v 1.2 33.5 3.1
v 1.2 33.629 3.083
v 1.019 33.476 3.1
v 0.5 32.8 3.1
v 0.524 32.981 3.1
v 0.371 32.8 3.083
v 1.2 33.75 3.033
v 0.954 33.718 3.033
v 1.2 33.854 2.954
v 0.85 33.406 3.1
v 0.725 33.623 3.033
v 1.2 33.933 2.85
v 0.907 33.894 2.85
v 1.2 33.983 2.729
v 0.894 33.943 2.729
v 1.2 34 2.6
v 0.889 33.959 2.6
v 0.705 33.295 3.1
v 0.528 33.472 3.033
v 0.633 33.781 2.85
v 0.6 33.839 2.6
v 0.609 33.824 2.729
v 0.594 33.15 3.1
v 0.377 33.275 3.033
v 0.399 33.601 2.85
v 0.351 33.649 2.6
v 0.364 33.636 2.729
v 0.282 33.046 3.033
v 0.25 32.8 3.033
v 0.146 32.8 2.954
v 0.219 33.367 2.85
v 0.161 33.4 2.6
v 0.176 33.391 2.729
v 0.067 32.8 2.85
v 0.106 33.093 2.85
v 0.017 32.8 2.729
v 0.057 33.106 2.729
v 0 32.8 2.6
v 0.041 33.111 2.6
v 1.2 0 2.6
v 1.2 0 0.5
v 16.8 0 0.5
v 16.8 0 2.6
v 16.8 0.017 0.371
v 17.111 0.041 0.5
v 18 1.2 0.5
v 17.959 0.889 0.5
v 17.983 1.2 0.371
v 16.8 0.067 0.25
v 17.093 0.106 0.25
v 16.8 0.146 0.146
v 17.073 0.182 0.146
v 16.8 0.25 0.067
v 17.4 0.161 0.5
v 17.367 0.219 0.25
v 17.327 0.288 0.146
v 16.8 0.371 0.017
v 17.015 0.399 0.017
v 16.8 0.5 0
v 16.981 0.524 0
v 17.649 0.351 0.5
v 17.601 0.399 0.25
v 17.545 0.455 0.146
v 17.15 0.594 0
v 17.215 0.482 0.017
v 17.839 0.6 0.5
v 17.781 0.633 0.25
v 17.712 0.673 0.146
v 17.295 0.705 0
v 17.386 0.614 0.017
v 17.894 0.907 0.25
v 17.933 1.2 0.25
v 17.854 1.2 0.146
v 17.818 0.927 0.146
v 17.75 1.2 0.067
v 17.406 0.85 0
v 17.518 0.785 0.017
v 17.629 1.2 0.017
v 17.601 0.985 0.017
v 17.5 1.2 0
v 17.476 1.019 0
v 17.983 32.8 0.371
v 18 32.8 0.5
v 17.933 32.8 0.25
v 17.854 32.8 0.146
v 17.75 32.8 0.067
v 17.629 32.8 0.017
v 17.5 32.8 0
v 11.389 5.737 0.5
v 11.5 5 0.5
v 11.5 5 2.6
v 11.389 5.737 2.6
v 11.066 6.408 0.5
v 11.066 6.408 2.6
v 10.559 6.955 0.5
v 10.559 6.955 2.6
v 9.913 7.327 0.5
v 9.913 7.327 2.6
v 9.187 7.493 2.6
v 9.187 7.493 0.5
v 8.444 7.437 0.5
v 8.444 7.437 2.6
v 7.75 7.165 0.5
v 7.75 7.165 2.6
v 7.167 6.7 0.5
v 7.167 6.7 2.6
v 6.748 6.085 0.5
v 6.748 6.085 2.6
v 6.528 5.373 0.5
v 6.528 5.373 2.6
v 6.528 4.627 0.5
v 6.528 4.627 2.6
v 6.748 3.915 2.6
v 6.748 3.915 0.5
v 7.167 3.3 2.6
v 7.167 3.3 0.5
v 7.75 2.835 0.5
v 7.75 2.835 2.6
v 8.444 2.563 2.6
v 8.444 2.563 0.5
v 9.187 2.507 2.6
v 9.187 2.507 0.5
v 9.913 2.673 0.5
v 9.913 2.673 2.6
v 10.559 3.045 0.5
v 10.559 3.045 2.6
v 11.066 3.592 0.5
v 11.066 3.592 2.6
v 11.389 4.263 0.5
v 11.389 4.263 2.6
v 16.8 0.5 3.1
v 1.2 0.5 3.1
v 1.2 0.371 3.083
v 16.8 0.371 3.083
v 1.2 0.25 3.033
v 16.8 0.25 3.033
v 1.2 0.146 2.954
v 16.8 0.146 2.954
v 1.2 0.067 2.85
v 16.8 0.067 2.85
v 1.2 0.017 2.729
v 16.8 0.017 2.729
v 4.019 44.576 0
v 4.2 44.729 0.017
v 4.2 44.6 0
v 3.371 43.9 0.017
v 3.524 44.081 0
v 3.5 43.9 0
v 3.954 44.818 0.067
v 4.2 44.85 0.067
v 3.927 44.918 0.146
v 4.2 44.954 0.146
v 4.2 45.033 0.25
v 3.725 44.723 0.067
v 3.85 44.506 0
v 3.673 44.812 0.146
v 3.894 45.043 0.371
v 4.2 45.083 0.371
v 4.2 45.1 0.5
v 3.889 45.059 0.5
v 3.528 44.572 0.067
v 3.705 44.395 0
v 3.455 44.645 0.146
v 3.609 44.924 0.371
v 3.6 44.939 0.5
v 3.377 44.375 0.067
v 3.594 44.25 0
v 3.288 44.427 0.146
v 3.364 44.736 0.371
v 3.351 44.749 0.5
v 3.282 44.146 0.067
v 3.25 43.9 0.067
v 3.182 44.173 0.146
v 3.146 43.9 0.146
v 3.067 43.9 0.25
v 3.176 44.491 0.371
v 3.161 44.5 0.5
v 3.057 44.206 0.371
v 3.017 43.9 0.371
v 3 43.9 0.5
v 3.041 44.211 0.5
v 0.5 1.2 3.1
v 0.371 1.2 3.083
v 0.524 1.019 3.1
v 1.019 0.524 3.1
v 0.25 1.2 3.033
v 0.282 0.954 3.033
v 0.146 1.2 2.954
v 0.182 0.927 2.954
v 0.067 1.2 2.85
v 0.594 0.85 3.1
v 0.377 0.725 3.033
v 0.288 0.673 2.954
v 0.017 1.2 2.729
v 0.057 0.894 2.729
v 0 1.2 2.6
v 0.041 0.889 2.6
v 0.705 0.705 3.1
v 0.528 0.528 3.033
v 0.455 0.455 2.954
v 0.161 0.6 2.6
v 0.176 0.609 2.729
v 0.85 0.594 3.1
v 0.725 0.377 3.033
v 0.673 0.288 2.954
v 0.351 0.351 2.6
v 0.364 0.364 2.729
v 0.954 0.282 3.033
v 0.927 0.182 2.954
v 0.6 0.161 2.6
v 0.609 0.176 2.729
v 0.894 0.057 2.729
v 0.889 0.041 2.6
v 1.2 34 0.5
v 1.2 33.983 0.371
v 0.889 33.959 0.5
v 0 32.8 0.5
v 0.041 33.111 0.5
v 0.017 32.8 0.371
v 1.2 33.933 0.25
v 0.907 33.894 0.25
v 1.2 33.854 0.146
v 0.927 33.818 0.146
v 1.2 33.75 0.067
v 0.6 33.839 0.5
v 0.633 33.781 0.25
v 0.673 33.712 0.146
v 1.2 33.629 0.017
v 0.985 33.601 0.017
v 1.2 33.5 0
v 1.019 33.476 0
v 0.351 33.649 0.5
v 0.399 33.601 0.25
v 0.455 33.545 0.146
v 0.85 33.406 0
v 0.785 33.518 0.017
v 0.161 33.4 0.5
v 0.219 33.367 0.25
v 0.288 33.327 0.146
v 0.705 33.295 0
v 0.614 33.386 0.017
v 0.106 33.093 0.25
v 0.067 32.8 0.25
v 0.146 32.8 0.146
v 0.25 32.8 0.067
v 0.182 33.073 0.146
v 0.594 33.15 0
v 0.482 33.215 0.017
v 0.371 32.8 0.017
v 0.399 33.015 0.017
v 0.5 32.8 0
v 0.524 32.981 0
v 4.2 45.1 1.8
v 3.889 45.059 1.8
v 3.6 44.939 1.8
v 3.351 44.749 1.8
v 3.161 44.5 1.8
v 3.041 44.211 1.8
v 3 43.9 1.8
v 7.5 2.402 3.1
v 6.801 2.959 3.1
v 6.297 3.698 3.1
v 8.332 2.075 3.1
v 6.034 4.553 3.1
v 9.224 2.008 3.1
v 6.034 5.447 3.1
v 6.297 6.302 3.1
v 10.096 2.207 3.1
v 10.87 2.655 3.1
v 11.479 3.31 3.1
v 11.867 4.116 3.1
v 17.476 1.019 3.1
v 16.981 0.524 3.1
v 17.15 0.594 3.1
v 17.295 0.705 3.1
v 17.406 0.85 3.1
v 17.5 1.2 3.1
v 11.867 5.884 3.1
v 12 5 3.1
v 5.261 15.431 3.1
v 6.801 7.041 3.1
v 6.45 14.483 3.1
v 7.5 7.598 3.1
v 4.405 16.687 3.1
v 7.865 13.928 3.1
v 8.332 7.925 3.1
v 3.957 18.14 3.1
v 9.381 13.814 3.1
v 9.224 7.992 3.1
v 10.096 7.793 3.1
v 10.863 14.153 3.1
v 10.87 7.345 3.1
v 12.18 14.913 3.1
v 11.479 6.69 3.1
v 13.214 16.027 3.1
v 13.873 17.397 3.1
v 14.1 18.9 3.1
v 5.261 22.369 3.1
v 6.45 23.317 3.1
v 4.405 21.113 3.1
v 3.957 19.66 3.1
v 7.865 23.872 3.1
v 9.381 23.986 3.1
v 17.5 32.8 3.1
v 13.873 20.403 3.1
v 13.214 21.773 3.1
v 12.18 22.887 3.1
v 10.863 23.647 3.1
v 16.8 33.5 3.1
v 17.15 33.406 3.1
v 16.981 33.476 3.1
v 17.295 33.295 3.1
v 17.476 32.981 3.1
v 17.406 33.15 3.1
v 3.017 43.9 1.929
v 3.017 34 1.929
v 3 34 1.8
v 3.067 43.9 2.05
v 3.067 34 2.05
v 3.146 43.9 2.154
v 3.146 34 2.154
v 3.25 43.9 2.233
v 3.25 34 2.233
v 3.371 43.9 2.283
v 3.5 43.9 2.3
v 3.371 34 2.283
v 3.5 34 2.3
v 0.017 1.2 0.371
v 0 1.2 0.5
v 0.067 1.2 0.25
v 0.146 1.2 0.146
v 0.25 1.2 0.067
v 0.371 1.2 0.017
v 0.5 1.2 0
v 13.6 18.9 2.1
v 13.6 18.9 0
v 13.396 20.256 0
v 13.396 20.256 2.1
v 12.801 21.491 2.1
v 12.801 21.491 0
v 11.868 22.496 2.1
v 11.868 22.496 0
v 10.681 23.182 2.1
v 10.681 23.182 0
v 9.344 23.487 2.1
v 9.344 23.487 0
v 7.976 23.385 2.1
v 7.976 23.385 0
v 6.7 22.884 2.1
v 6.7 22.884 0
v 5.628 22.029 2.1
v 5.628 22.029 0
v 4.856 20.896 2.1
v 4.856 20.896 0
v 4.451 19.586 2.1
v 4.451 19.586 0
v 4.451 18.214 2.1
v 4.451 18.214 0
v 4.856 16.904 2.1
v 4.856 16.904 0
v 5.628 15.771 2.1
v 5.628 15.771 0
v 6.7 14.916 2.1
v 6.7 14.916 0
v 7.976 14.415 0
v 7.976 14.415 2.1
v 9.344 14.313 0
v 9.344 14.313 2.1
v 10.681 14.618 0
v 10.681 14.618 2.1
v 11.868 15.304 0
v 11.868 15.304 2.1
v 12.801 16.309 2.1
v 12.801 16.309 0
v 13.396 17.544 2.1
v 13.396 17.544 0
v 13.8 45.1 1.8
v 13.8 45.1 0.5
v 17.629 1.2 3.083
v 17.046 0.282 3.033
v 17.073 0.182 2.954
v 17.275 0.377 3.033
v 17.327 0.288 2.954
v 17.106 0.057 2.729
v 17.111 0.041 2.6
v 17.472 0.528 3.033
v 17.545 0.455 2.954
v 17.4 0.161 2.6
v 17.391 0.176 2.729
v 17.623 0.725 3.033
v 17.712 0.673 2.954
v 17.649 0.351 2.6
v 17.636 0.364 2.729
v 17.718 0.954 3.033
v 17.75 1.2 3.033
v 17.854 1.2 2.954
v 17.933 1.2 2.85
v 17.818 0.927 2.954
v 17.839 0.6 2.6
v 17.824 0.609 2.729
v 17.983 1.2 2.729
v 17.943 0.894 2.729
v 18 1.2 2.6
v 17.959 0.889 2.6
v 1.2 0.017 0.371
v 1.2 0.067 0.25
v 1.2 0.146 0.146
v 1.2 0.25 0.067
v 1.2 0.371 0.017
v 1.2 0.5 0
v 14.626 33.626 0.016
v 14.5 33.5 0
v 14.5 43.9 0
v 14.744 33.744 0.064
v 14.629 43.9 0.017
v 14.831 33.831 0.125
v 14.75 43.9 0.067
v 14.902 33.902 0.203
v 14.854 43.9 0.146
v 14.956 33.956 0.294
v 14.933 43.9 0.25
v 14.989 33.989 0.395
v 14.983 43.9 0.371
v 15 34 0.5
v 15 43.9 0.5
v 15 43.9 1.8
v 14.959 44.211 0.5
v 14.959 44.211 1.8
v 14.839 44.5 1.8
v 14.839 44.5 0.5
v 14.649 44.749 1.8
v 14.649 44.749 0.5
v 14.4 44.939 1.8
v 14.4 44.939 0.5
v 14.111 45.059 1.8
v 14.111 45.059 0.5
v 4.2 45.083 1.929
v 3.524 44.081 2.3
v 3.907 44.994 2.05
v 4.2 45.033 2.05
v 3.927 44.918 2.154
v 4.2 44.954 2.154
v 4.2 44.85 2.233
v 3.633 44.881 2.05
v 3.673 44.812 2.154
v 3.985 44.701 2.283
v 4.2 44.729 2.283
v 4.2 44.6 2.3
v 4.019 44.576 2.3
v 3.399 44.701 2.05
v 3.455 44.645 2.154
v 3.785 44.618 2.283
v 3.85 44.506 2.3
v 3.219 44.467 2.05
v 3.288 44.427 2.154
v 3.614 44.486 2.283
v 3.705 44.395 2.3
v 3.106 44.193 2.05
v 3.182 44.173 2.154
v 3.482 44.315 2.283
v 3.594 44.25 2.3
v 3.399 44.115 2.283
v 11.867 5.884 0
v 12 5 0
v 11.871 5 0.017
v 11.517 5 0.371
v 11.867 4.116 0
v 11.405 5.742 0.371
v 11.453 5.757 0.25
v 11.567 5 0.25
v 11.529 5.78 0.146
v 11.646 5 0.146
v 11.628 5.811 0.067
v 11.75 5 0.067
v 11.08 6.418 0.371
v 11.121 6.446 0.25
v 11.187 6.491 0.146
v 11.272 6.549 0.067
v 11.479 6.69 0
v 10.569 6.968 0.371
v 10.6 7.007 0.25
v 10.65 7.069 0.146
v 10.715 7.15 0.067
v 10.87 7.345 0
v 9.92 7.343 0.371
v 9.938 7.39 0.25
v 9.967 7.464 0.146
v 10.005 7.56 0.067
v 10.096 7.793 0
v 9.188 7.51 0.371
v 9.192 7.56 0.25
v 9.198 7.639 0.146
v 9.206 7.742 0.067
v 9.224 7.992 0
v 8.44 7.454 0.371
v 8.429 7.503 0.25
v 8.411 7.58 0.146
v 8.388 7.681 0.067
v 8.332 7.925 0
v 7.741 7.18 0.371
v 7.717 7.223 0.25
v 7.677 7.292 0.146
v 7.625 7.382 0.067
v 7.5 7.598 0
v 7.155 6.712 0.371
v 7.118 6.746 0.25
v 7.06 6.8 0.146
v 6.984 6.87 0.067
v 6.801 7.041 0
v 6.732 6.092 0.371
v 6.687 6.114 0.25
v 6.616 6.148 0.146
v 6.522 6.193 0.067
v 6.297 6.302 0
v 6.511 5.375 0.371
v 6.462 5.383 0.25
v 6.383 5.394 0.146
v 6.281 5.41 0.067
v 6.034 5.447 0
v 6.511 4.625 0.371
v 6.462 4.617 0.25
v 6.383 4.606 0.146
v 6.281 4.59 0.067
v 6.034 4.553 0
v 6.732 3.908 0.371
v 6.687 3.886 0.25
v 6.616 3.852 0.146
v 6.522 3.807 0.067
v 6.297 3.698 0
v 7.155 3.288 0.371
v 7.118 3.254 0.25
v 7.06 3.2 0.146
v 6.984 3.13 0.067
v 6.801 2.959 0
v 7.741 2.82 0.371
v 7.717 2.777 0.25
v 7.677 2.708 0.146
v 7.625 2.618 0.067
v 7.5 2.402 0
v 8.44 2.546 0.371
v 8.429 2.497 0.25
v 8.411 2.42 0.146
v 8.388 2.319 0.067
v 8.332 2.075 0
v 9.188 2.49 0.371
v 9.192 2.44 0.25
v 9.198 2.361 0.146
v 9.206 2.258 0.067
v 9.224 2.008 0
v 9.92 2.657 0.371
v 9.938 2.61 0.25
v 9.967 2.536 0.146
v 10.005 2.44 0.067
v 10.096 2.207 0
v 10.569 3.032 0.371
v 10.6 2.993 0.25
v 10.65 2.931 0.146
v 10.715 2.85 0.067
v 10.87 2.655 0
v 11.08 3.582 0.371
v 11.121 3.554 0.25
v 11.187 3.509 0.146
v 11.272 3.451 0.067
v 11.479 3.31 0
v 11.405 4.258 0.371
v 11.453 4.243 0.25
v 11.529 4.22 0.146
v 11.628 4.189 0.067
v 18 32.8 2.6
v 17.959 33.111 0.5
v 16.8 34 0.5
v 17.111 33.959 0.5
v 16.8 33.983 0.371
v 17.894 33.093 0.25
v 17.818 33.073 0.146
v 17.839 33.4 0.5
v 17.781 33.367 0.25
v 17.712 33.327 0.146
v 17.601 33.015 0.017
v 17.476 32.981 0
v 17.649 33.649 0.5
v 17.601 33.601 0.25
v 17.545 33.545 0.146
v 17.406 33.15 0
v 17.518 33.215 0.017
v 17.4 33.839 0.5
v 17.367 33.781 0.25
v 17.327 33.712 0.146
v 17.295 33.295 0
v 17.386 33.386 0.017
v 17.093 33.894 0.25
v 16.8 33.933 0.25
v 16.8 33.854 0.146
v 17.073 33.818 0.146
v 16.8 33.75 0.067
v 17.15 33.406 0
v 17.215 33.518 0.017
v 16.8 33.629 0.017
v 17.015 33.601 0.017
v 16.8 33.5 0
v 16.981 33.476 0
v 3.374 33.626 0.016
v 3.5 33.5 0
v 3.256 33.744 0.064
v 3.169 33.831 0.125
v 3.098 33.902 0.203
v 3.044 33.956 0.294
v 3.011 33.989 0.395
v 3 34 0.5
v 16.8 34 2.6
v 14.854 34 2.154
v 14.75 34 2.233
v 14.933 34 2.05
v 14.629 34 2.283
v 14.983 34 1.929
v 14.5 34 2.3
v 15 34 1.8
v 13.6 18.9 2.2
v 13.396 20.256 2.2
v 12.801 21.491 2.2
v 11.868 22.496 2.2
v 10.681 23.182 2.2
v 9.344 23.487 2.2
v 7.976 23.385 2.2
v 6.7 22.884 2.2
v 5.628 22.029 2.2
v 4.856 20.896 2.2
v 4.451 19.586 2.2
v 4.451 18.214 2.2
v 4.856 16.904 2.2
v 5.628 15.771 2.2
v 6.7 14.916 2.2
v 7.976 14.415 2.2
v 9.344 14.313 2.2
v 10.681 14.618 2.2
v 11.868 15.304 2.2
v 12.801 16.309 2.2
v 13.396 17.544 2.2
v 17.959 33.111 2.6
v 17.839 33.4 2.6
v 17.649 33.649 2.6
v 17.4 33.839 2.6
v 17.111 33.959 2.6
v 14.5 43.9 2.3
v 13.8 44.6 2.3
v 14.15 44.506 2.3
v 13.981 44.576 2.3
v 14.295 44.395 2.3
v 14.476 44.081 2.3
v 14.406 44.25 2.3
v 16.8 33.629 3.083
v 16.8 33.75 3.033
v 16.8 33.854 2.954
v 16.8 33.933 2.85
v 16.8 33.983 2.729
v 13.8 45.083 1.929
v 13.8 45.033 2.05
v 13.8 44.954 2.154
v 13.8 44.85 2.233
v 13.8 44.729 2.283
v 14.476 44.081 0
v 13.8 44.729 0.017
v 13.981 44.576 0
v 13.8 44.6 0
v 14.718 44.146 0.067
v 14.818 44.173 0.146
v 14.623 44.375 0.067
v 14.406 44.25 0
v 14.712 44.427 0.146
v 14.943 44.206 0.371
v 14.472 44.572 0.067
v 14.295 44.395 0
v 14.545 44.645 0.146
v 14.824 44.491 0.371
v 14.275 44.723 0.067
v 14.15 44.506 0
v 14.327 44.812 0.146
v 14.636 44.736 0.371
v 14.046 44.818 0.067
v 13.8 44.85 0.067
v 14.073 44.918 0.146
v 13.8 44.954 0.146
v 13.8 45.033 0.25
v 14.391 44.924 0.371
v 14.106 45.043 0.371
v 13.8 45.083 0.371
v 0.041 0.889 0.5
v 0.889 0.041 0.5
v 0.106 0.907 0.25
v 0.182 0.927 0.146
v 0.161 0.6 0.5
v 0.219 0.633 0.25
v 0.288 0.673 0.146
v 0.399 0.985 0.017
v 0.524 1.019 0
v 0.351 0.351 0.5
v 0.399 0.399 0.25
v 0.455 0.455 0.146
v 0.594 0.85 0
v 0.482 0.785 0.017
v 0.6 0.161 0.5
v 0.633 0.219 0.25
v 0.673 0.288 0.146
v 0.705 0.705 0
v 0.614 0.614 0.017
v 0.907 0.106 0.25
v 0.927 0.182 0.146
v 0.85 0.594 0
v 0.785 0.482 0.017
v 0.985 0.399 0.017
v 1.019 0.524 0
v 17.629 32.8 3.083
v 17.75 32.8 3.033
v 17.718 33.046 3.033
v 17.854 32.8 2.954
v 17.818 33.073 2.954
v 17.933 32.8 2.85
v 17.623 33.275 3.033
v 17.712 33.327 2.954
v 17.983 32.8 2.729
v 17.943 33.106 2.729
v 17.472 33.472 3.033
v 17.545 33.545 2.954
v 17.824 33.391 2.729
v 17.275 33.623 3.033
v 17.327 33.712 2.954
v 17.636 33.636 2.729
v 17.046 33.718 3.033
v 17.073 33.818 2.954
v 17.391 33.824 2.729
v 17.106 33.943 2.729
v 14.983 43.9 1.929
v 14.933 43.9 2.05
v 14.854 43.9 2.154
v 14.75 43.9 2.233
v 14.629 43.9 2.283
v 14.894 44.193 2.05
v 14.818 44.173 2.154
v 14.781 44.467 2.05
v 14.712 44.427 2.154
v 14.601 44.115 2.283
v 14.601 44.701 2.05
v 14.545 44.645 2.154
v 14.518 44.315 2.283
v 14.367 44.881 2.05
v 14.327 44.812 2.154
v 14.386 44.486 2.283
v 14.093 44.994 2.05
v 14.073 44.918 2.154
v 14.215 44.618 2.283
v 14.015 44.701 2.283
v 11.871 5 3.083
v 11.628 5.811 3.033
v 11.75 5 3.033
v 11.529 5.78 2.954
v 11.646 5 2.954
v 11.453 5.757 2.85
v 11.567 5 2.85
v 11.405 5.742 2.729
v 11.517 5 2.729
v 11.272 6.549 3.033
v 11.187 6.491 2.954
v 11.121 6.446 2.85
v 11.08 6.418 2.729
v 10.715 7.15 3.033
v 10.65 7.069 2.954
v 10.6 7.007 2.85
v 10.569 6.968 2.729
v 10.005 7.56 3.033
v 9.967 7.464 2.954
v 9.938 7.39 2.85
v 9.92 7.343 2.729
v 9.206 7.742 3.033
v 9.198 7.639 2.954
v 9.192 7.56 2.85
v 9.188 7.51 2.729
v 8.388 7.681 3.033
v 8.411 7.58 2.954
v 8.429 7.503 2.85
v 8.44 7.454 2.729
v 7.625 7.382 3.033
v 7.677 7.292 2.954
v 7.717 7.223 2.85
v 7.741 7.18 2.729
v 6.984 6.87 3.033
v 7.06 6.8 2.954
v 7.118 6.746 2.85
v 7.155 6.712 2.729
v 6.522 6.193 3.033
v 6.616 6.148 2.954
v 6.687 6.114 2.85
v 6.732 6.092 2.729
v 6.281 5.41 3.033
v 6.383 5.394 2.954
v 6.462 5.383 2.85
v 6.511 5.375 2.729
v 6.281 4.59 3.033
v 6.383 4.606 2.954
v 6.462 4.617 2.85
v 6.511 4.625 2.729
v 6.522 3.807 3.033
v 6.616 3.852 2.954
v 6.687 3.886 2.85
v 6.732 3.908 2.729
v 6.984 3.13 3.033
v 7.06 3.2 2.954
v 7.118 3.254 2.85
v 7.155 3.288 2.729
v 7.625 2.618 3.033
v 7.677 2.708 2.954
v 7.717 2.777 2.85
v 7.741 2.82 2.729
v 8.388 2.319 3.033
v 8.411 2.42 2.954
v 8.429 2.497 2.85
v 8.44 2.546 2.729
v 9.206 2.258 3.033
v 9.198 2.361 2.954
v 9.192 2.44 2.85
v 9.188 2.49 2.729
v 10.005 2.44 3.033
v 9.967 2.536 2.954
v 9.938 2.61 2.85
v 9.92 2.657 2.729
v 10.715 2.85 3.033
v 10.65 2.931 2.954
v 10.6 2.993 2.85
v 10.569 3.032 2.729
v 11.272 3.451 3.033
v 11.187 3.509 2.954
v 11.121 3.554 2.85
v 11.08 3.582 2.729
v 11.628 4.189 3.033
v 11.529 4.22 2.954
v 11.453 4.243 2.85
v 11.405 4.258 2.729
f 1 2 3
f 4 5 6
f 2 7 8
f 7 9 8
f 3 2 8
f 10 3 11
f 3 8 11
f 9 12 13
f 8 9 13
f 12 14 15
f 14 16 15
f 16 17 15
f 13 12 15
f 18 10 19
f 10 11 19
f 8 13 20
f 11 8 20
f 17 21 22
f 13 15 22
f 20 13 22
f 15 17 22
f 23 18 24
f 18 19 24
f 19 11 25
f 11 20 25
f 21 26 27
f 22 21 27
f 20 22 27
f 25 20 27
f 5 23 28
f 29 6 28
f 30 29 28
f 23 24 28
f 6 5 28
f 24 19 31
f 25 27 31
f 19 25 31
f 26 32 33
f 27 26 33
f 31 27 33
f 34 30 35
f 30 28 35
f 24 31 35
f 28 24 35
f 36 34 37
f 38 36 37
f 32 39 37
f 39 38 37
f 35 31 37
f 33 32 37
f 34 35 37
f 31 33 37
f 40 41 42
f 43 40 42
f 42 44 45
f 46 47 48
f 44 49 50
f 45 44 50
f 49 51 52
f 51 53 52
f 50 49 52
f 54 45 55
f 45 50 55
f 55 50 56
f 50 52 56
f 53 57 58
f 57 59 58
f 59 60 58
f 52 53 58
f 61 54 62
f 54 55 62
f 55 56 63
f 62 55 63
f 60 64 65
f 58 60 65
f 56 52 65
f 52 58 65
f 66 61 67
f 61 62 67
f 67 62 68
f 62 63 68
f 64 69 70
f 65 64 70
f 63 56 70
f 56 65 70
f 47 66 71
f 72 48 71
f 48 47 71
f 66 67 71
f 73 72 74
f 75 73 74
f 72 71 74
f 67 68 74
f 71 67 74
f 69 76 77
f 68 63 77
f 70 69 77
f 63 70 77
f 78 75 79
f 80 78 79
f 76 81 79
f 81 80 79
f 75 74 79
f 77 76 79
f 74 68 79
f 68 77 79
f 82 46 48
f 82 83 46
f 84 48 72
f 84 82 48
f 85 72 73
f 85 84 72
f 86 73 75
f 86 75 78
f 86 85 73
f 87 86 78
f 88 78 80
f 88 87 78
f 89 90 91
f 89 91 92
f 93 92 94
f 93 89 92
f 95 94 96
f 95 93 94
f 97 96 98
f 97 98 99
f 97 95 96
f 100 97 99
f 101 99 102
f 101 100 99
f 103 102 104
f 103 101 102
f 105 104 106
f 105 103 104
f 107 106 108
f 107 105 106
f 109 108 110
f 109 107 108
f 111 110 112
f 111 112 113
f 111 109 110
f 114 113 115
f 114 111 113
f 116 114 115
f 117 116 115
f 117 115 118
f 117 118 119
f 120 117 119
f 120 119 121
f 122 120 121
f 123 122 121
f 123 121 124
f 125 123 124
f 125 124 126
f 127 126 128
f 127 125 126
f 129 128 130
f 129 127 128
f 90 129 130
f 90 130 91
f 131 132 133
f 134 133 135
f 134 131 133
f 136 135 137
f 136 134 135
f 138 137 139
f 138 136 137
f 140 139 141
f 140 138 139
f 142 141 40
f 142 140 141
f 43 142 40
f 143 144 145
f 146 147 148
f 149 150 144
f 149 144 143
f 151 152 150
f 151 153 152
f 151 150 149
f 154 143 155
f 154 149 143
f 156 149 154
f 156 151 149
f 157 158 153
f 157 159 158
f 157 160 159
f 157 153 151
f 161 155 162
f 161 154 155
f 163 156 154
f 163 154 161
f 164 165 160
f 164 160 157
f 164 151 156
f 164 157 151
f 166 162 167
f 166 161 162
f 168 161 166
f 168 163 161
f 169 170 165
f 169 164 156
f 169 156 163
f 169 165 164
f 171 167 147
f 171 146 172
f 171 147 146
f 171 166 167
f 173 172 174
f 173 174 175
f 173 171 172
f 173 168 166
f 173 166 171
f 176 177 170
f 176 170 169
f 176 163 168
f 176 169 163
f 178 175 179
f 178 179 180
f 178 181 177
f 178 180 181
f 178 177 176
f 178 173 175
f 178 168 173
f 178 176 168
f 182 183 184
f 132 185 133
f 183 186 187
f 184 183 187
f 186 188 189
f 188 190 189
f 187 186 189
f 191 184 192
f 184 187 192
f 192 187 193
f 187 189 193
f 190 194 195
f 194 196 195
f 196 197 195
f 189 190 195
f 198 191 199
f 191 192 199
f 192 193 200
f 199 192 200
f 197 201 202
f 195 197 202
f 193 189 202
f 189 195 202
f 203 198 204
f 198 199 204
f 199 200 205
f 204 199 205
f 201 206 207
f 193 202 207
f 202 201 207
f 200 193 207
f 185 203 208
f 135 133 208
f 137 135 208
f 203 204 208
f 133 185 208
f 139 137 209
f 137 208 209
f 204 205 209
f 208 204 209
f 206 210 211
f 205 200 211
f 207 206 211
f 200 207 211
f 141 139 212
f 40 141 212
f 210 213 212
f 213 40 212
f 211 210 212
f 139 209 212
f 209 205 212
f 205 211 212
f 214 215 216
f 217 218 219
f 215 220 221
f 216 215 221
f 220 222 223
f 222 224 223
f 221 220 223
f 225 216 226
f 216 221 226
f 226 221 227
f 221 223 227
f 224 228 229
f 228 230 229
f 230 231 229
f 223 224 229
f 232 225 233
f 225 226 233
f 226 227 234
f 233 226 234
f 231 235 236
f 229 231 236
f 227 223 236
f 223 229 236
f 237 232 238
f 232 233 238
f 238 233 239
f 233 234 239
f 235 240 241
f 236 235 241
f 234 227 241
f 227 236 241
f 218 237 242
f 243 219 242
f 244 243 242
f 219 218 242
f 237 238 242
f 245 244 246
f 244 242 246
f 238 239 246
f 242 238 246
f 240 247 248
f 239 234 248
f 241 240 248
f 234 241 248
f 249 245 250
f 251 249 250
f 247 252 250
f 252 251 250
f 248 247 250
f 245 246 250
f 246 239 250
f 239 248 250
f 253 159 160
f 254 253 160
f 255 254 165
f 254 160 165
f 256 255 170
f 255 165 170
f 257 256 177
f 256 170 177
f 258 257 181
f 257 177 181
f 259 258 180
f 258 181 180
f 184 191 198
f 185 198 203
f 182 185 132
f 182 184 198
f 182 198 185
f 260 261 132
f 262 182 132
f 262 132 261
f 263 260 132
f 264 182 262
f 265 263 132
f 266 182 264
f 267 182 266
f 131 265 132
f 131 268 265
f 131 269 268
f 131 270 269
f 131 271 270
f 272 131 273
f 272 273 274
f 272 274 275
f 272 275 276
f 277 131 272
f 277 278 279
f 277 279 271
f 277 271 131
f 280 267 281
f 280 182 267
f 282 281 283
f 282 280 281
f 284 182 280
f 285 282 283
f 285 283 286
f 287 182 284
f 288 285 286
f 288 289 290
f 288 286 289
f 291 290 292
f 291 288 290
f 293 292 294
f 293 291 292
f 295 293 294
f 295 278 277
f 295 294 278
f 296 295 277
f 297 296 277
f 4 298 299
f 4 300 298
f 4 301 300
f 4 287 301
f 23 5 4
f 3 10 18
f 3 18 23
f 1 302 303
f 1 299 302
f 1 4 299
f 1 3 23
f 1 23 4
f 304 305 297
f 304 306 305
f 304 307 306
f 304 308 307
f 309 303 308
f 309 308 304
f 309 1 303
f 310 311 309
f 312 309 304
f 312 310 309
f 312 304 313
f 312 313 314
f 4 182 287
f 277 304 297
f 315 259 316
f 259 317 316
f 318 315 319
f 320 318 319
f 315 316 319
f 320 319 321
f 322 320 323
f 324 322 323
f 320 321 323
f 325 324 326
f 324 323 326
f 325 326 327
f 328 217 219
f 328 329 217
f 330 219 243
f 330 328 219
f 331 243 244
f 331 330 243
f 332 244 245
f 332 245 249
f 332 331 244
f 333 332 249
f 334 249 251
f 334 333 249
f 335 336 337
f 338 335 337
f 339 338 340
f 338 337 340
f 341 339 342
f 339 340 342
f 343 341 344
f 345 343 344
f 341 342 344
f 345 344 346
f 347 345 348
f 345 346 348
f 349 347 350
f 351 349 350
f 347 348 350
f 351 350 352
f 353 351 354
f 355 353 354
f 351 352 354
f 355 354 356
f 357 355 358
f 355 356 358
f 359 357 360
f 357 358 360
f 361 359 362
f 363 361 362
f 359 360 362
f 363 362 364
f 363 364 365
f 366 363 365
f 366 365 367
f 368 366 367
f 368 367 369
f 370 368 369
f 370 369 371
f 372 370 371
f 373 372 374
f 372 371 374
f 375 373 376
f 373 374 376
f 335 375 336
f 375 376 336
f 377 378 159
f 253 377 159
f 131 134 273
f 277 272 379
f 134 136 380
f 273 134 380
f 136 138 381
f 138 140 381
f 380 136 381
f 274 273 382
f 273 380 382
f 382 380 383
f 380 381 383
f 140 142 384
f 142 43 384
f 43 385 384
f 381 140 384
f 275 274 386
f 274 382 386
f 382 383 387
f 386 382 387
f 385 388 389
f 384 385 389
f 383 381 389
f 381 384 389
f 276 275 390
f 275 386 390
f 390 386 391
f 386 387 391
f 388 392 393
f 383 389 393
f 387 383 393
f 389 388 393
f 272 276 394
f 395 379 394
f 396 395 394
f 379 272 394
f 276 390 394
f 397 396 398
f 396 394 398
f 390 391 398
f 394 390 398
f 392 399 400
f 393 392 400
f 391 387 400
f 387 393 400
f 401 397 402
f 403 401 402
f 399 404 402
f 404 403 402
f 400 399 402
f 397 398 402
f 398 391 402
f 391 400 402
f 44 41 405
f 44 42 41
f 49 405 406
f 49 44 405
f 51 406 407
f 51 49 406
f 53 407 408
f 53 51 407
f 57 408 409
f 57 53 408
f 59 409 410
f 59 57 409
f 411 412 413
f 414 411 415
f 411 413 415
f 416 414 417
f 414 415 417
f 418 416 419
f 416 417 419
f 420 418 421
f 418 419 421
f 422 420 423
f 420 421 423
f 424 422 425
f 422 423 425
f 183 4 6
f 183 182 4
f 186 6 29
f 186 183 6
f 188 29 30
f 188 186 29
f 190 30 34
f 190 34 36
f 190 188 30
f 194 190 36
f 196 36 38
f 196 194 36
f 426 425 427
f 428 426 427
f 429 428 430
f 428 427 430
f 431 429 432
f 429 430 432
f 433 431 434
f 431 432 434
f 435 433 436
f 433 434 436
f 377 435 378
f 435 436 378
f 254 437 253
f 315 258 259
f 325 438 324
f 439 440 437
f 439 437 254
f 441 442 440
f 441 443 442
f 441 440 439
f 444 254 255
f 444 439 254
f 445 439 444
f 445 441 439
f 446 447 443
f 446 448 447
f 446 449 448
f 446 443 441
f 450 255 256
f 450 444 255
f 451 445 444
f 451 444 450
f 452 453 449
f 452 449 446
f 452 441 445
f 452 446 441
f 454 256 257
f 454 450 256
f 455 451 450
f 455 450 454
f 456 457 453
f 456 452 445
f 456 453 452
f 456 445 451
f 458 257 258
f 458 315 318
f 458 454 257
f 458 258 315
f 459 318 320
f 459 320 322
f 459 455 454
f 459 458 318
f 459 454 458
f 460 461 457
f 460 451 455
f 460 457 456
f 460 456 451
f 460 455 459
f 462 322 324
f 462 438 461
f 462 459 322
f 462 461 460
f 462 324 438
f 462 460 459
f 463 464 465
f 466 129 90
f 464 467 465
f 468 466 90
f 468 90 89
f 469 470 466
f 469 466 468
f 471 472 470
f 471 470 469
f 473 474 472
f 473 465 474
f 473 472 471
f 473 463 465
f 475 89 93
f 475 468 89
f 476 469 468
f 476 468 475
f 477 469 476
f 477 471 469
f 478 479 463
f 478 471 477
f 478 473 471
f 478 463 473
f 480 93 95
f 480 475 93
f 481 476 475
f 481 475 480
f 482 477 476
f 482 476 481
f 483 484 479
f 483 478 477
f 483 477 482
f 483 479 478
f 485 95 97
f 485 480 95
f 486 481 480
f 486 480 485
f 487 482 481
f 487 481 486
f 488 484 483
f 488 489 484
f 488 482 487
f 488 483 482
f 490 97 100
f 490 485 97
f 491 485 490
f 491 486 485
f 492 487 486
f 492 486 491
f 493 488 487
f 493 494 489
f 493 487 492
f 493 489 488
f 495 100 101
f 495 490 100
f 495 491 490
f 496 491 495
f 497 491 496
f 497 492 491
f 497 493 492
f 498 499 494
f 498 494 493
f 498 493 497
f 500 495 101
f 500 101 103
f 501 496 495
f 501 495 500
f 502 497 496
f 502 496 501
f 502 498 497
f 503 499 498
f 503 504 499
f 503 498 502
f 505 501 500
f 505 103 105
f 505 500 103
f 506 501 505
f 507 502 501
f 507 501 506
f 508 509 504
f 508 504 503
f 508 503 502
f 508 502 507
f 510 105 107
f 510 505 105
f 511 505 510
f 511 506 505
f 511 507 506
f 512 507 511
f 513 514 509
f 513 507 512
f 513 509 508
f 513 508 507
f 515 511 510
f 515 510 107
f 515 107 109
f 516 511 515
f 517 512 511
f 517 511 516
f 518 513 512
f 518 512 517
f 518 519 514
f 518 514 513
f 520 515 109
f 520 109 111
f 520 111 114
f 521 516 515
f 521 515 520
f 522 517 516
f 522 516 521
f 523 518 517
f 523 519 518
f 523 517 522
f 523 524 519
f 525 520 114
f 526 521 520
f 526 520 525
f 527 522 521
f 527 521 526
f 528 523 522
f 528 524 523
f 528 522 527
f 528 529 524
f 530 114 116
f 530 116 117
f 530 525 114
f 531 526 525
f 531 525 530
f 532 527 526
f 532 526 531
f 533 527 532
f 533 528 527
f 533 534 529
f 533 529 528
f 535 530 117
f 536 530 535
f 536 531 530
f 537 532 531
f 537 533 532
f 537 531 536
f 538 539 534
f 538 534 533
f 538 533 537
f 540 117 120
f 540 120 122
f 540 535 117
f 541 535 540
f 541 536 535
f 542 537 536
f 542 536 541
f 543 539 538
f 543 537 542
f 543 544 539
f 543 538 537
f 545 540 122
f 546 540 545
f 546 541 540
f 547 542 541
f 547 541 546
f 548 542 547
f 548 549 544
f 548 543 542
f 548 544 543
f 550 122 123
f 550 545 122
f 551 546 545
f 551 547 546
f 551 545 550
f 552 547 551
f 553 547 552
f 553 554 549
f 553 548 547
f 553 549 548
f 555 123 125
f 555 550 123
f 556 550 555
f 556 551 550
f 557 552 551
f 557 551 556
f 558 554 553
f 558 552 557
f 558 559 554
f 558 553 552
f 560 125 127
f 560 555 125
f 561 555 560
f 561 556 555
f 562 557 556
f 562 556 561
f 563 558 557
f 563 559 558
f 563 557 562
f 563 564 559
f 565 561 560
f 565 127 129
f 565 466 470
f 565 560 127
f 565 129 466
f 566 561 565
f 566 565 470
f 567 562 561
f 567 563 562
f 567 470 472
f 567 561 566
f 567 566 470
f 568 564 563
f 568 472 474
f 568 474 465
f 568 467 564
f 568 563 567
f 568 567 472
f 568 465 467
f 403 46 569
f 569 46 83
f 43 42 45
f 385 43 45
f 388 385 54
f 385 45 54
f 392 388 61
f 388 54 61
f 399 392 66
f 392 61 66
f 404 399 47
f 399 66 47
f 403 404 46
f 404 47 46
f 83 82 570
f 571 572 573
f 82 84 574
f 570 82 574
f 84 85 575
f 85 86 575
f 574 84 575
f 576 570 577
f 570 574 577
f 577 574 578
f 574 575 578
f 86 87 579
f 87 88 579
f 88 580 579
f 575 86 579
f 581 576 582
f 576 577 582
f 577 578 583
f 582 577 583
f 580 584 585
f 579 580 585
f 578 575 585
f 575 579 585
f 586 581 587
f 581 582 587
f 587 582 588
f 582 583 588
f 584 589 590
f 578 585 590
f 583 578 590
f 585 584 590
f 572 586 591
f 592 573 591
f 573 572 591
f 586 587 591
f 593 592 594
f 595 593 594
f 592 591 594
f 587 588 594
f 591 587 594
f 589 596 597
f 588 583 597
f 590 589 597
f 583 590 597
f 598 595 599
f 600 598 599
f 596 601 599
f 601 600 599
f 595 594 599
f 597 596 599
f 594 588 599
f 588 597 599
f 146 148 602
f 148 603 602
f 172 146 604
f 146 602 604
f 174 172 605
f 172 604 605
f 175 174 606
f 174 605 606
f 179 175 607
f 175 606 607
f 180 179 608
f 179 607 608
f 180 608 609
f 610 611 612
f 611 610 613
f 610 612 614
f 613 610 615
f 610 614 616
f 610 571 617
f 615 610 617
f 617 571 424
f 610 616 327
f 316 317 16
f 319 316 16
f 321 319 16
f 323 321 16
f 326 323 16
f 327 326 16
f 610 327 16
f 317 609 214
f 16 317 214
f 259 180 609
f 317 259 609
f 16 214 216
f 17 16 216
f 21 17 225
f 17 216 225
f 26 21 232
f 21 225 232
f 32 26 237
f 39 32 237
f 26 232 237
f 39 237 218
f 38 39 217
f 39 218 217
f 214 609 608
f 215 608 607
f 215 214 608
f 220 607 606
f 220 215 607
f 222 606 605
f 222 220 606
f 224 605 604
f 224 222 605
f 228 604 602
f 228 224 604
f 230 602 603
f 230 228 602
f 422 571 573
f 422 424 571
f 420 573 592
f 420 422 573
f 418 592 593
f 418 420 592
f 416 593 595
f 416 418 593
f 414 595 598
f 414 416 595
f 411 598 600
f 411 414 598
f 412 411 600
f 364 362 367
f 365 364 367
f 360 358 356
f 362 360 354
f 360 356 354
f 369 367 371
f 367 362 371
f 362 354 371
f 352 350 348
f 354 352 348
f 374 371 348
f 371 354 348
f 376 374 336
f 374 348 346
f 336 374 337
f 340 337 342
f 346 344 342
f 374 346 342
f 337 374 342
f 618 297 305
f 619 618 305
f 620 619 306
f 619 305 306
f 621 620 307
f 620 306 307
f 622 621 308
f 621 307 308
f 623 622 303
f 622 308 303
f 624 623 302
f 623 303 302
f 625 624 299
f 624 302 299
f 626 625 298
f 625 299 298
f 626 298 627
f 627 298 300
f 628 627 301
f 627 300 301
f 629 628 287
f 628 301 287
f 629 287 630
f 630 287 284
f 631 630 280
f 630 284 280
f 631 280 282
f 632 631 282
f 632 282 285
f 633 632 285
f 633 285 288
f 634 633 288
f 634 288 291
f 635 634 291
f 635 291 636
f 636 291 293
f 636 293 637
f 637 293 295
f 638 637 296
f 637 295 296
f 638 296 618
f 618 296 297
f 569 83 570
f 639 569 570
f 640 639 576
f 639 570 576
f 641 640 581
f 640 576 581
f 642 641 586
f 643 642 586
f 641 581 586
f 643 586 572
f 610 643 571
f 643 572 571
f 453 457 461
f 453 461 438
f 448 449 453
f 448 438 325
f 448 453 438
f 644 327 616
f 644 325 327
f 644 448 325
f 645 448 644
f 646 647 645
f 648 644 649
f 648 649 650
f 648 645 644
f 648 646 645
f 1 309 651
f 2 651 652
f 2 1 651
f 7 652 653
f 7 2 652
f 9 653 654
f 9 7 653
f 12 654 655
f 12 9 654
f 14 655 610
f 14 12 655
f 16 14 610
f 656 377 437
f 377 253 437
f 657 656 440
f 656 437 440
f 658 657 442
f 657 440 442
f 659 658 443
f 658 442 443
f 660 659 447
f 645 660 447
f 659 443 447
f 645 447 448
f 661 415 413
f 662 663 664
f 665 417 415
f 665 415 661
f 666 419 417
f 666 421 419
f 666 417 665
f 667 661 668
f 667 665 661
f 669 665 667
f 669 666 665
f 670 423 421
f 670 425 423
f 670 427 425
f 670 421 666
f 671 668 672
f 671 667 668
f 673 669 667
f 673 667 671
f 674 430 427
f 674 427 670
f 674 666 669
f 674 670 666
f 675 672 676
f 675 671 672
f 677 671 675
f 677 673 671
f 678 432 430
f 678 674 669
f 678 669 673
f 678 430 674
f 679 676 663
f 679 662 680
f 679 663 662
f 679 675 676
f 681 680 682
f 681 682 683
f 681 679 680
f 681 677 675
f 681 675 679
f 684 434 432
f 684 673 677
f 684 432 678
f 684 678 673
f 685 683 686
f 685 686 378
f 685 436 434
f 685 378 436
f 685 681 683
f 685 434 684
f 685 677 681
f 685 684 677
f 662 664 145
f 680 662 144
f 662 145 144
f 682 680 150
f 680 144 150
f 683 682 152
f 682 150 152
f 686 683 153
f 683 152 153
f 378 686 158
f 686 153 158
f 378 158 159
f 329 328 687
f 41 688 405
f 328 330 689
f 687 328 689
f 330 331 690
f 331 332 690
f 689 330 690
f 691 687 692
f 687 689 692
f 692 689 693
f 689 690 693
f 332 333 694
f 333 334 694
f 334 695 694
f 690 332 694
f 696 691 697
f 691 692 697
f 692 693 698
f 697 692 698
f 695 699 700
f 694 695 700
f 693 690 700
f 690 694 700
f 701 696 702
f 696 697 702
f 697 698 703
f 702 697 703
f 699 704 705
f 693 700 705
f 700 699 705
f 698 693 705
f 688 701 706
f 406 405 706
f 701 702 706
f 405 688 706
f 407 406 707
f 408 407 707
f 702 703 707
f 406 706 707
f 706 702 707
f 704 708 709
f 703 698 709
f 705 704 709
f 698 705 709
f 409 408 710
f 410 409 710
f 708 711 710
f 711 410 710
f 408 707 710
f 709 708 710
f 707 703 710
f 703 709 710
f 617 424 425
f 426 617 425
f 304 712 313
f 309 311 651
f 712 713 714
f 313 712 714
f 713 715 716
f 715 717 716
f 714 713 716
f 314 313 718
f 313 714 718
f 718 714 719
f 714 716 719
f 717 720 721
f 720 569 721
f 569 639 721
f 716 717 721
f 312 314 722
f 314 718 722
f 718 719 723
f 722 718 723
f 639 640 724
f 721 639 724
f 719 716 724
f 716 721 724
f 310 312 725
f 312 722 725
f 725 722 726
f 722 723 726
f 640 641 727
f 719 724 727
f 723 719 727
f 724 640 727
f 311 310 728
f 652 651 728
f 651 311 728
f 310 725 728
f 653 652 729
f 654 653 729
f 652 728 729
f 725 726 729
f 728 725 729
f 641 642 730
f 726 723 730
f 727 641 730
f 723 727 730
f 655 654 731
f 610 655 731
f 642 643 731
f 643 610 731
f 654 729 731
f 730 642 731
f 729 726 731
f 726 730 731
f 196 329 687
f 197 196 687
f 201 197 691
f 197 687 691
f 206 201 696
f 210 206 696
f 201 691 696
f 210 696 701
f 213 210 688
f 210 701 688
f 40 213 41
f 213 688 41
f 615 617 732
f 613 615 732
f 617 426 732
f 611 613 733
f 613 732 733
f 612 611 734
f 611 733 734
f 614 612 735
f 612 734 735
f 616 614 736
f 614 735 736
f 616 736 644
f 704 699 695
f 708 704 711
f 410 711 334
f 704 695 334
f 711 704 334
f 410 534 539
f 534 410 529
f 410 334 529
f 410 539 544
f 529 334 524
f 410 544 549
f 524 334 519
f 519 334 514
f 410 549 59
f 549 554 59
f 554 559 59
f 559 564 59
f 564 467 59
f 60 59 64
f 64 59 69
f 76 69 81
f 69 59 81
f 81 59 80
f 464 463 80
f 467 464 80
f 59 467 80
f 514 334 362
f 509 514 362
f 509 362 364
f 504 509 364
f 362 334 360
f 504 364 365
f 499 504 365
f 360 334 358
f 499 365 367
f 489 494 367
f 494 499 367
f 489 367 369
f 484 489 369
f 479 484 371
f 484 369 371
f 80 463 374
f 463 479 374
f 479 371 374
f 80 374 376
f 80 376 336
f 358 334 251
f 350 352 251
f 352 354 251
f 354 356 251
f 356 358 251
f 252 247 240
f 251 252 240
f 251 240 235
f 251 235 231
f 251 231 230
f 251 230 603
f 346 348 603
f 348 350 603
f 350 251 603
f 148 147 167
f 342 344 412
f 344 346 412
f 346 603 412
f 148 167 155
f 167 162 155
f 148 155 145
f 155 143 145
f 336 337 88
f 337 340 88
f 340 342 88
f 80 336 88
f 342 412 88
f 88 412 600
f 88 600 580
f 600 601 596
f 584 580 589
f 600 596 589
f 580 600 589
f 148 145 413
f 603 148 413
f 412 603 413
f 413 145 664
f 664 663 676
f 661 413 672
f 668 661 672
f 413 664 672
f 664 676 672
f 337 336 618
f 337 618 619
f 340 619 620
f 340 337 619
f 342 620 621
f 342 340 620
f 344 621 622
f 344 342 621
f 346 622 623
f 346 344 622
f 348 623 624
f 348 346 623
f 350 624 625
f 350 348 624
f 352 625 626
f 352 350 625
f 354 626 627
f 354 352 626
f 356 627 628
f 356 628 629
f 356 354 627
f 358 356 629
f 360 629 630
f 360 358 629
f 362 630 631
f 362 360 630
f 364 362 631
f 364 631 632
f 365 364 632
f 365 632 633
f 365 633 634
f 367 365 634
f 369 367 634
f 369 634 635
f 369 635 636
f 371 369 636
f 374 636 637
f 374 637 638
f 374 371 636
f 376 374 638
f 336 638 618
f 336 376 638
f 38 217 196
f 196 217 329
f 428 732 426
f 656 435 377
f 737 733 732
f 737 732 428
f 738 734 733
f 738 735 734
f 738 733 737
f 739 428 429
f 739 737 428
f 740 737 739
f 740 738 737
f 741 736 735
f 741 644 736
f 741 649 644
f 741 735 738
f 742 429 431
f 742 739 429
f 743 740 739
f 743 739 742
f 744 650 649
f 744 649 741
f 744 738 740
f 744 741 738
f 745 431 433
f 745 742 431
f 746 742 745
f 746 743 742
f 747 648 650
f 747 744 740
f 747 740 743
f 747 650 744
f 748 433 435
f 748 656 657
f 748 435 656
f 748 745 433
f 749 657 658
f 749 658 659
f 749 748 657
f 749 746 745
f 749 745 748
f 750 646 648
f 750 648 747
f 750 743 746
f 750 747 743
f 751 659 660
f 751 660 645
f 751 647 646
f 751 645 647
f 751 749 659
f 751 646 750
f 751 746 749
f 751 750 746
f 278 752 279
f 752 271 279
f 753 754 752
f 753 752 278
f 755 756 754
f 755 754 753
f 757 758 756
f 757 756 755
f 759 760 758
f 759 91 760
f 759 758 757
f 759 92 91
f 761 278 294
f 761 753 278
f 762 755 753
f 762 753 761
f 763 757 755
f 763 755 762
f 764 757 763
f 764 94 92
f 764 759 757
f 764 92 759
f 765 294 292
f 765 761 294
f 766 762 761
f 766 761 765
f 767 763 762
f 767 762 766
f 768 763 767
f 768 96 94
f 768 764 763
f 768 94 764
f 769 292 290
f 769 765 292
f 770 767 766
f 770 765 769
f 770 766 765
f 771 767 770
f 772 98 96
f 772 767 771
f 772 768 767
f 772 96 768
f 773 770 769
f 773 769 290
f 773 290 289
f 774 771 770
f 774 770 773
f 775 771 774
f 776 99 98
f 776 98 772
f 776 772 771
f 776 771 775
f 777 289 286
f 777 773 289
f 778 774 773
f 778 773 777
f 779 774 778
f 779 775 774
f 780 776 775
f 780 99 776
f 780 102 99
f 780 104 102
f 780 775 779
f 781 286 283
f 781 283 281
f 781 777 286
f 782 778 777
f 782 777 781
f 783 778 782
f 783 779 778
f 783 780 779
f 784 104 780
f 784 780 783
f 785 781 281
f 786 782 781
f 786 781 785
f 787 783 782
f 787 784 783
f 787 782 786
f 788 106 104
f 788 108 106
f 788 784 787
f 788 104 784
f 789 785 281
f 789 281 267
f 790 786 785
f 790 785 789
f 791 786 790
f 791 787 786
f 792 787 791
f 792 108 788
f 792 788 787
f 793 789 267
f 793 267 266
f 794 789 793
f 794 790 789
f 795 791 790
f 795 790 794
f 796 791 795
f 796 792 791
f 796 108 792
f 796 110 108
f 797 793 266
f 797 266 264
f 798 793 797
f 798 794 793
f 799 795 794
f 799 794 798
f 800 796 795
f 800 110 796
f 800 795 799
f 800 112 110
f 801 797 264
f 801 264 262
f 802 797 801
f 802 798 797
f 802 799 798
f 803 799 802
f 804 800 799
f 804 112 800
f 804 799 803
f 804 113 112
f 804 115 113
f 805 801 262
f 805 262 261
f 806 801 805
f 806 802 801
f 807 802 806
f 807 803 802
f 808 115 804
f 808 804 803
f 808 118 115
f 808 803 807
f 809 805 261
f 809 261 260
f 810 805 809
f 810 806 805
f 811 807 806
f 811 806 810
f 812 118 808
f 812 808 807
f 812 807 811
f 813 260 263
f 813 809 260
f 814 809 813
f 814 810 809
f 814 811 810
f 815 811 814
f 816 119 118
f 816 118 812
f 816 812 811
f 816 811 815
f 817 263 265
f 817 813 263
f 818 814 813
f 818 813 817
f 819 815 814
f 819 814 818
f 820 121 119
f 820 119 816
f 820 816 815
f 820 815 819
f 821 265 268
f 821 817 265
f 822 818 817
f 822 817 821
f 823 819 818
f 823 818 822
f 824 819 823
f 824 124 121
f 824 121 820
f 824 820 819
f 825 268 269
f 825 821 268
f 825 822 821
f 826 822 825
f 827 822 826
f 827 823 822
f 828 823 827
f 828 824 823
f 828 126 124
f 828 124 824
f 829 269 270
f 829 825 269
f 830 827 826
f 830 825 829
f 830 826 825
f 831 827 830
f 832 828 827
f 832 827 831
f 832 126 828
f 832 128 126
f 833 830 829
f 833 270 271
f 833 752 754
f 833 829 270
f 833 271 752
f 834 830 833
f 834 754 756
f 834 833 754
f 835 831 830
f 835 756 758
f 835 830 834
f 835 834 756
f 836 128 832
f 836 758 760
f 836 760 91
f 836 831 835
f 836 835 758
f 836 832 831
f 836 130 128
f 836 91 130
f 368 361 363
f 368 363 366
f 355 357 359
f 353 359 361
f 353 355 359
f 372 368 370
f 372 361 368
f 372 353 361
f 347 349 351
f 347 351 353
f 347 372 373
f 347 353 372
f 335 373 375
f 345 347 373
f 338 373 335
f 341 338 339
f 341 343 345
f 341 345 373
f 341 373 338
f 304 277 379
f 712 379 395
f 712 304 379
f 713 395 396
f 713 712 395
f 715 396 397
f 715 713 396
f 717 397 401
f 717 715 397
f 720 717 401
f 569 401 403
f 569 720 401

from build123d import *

# Parameters (mm, degrees)
F0_R     = 2.5
F0_R_2   = 4.6
F1_DEPTH = 3.1
F2_DEPTH = 2.3
F3_DEPTH = 2.1
F4_SIZE2 = 0.5
F4_SIZE  = 0.9
F5_R     = 0.5


with BuildPart() as f1:
    # F0 (on Top) → F1 (new body)
    with BuildSketch(Plane.XY):
        with BuildLine():
            ThreePointArc((0, 1.2), (0.3514718626, 0.3514718626), (1.2, 0))
            Line((1.2, 0), (16.8, 0))
            ThreePointArc((16.8, 0), (17.6485281374, 0.3514718626), (18, 1.2))
            Line((18, 1.2), (18, 32.8))
            ThreePointArc((18, 32.8), (17.6485281374, 33.6485281374), (16.8, 34))
            Line((16.8, 34), (15, 34))
            Line((15, 34), (3, 34))
            Line((3, 34), (1.2, 34))
            ThreePointArc((1.2, 34), (0.3514718626, 33.6485281374), (0, 32.8))
            Line((0, 32.8), (0, 1.2))
        make_face()
        with Locations((9, 5)):
            Circle(F0_R, mode=Mode.SUBTRACT)
        with Locations((9, 18.9)):
            Circle(F0_R_2, mode=Mode.SUBTRACT)
    extrude(amount=F1_DEPTH)

    # F0 (on Top) → F2 (join)
    with BuildSketch(Plane.XY):
        with BuildLine():
            Line((3, 43.9), (3, 34))
            Line((3, 34), (15, 34))
            Line((15, 34), (15, 43.9))
            ThreePointArc((15, 43.9), (14.6485281374, 44.7485281374), (13.8, 45.1))
            Line((13.8, 45.1), (4.2, 45.1))
            ThreePointArc((4.2, 45.1), (3.3514718626, 44.7485281374), (3, 43.9))
        make_face()
    extrude(amount=F2_DEPTH)

    # F4
    f4_edges = [f1.edges().sort_by_distance(p)[0] for p in [
        (4.4, 18.9, 3.1),
    ]]
    f4_side = f1.faces().sort_by_distance((4.4, 18.9, 1.55))[0]
    chamfer(f4_edges, length=F4_SIZE, length2=F4_SIZE2, reference=f4_side)

    # F5
    f5_edges = [f1.edges().sort_by_distance(p)[0] for p in [
        (0, 17, 3.1),
        (18, 17, 0),
        (6.5, 5, 3.1),
        (15, 38.95, 2.3),
        (6.5, 5, 0),
        (15, 38.95, 0),
    ]]
    fillet(f5_edges, radius=F5_R)


with BuildPart() as f3:
    # F0 (on Top) → F3 (new body)
    with BuildSketch(Plane.XY):
        with Locations((9, 18.9)):
            Circle(F0_R_2)
    extrude(amount=F3_DEPTH)


solid = Compound([f1.part, f3.part])
